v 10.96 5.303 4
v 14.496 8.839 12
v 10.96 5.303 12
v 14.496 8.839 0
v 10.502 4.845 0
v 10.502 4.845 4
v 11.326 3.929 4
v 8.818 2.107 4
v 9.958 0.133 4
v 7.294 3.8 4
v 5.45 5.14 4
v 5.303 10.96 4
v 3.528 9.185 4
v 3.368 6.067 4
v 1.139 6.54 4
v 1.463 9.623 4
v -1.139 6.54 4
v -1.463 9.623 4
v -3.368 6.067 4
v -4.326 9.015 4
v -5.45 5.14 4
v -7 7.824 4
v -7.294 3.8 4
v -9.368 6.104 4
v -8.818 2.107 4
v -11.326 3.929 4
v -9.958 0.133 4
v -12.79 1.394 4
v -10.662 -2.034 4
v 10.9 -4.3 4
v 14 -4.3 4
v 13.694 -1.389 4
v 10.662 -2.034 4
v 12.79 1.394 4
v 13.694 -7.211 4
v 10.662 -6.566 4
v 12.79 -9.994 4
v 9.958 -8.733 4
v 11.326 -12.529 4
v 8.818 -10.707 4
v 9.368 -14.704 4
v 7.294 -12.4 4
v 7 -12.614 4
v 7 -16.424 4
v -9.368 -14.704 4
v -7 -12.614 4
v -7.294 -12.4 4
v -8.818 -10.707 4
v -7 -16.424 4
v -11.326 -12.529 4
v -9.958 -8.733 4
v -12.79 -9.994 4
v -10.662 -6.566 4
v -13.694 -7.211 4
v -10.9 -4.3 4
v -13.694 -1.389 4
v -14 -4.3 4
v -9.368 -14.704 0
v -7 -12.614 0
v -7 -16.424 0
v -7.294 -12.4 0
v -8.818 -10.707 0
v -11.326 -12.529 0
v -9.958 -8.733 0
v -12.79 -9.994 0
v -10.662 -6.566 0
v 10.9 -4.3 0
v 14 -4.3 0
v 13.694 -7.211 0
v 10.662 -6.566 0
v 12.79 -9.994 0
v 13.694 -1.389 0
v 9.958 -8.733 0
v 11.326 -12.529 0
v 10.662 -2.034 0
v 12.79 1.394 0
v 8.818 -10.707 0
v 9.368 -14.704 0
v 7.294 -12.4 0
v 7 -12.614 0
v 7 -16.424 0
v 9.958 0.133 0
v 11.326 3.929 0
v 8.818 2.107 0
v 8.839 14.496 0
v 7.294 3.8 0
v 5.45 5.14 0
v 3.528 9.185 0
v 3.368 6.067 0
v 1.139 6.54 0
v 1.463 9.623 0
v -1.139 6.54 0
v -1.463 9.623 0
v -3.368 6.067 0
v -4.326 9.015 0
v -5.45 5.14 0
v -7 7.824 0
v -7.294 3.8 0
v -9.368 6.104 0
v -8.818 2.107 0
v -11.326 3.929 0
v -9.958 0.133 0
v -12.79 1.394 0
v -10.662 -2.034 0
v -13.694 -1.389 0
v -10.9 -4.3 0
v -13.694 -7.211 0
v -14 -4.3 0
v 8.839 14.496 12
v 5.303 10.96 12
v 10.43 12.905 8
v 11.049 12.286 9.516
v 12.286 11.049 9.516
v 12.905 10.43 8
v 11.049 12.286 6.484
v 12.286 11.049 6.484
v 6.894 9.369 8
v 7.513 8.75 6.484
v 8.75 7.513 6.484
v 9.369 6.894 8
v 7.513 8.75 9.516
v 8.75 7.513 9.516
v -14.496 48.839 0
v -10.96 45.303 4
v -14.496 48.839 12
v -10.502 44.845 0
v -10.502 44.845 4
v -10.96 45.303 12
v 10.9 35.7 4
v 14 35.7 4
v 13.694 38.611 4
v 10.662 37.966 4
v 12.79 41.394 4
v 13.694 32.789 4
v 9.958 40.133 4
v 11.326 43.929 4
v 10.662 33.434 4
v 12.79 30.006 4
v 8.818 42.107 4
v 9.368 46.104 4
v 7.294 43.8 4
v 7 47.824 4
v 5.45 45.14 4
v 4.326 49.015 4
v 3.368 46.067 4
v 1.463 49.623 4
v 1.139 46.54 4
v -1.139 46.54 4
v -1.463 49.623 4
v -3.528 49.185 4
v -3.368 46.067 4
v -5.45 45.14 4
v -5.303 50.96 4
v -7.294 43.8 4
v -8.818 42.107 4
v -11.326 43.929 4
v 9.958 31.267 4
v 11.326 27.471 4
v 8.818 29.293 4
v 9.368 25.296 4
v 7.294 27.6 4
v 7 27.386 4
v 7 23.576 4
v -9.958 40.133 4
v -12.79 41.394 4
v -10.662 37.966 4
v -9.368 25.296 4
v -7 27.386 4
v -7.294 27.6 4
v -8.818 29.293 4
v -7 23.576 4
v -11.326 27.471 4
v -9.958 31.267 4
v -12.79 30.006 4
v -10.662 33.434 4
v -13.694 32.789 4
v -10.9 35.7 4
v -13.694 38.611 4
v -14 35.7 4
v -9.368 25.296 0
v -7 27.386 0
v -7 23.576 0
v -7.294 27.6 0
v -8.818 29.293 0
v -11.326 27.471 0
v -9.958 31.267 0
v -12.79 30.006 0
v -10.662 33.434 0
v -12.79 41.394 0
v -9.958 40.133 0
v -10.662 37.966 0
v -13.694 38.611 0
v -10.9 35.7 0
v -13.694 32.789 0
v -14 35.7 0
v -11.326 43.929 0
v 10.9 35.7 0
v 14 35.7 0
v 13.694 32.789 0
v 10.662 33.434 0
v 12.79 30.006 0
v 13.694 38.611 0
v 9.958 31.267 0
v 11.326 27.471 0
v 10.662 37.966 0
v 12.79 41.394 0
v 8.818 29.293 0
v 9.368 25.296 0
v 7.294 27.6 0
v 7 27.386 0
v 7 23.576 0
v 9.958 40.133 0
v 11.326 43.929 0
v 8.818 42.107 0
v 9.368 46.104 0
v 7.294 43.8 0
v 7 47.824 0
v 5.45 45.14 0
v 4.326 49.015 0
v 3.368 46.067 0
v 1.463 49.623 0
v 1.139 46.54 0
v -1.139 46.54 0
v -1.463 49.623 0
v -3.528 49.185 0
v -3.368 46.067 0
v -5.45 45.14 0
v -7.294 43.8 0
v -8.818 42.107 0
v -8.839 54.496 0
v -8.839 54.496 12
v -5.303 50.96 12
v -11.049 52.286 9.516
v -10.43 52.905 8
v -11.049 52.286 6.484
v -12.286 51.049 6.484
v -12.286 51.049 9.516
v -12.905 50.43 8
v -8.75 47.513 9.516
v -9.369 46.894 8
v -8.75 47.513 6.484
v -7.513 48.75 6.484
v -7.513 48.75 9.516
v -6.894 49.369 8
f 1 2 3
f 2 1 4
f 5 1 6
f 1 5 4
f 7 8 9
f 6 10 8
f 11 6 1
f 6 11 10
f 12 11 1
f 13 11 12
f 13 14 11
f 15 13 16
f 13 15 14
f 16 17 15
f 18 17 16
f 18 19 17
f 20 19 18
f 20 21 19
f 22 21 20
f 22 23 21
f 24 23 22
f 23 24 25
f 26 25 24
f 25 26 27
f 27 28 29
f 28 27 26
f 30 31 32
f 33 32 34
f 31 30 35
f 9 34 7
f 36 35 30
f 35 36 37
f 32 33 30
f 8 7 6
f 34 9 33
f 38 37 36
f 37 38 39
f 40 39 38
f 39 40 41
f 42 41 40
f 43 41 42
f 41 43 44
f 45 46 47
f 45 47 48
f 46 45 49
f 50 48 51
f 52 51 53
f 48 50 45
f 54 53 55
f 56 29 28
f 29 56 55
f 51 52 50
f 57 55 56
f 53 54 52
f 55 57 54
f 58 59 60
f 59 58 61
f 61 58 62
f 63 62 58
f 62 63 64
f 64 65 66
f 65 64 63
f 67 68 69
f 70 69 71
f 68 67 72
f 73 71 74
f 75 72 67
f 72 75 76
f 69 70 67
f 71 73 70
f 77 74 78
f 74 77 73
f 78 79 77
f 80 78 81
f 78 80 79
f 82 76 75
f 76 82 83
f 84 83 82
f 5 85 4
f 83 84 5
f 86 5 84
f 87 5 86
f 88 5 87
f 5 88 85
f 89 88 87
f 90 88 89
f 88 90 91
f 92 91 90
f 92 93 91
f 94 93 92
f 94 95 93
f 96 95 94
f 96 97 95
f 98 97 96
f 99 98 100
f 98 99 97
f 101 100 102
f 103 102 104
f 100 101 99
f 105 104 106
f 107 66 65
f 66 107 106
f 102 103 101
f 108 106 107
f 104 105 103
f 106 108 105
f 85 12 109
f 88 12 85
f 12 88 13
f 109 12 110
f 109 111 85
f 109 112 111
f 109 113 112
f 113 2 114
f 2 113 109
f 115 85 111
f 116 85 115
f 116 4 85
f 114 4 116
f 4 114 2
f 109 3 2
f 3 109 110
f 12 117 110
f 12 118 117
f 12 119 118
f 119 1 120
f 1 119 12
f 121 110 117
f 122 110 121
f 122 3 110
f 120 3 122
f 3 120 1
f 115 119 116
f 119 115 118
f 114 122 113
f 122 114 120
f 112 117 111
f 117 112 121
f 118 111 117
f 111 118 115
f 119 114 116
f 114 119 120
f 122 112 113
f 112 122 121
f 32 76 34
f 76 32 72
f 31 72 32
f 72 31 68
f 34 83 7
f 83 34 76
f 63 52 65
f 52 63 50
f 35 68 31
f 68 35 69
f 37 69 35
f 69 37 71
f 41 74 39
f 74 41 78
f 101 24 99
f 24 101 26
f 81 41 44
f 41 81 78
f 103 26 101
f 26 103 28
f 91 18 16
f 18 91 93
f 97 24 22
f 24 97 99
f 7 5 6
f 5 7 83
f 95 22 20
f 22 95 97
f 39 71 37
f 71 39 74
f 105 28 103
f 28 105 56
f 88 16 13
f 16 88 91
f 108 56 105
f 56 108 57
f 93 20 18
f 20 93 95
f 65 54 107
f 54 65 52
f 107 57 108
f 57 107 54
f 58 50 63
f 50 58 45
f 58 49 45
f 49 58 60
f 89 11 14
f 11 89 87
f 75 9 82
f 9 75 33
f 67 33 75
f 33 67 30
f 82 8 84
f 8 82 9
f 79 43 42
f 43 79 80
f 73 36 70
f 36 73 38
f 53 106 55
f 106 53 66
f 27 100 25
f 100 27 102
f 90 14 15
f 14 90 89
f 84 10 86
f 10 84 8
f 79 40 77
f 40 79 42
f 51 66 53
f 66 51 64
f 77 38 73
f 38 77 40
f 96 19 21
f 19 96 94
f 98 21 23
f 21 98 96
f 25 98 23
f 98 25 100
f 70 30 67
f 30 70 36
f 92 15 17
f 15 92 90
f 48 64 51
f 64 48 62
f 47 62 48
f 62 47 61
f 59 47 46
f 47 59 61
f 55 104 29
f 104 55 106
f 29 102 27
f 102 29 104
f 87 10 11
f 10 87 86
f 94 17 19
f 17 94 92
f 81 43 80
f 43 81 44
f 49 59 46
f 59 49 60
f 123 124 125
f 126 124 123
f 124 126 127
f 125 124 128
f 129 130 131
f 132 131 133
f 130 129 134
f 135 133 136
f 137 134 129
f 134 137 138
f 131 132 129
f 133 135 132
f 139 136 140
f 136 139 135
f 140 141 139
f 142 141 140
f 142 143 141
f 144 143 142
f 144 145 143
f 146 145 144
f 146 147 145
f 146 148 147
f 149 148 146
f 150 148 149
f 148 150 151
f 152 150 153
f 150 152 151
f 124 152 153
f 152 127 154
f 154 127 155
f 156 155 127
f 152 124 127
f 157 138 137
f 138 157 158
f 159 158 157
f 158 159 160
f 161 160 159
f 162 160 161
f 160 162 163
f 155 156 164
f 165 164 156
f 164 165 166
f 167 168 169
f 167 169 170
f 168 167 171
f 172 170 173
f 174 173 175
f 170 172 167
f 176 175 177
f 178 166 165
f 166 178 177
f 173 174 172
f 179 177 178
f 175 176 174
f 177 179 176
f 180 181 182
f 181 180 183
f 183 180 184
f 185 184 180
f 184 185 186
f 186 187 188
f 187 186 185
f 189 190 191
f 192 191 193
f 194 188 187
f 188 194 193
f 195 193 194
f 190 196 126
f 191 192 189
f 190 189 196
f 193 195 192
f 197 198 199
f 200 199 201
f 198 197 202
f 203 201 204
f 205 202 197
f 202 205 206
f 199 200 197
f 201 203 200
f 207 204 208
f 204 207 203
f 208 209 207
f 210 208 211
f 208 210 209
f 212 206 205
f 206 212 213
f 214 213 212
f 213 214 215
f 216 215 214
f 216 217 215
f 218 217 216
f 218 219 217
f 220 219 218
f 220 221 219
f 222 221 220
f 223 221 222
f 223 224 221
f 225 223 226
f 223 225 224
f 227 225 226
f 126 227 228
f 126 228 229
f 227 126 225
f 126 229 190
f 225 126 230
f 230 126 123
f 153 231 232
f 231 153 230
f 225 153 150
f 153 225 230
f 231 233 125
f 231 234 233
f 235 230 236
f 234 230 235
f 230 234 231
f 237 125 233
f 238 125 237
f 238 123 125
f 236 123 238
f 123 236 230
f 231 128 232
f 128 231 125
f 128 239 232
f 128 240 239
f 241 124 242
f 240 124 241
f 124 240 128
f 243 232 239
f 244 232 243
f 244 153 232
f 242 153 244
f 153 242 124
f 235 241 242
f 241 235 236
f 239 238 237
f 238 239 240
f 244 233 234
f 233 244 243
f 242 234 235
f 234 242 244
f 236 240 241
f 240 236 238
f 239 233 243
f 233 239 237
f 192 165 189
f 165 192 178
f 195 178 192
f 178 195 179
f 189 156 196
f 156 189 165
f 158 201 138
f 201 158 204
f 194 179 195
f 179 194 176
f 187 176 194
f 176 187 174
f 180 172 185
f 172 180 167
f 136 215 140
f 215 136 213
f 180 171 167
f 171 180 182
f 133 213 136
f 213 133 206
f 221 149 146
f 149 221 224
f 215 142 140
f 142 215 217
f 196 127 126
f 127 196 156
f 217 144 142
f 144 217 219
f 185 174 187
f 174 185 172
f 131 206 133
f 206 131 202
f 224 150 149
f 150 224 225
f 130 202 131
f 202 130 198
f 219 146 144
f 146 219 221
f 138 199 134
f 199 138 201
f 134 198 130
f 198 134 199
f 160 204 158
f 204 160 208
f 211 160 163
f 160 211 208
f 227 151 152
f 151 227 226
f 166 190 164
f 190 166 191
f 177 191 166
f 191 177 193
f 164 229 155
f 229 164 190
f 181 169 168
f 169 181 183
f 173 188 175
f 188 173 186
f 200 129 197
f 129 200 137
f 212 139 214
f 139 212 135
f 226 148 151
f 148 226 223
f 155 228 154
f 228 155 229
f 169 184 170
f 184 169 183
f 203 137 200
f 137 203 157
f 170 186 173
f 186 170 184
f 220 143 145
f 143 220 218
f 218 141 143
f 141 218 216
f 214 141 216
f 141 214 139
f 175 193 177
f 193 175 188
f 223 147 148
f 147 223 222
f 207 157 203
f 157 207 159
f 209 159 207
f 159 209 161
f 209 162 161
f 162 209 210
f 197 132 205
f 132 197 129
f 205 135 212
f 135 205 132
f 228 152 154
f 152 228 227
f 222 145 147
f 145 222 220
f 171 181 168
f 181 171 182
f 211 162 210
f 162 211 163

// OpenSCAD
// Set your fan angle as desired
fan_angle = 45; // [0:90]

fan_clip();

translate([0,40,0])
mirror([1,0,0])
fan_clip();

module fan_clip()
{
	rotate([0,0,-fan_angle])
	difference()
	{
		union()
		{
			translate([-4,8.5,0])
			cube([8,8,4]);

			translate([-4,11.5,0])
			cube([8,5,12]);
		}

		translate([0,20,8])
		rotate([90,0,0])
		cylinder(r=3.5/2, h=15);
	}

	difference(){
		translate([0,-4.3,0])
		cylinder(r=14, h=4);

		translate([0,-4.3,-1])
		cylinder(r=10.9, h=6);

		translate([-7,-20,-1])
		cube([14,10,6]);
	}
}
